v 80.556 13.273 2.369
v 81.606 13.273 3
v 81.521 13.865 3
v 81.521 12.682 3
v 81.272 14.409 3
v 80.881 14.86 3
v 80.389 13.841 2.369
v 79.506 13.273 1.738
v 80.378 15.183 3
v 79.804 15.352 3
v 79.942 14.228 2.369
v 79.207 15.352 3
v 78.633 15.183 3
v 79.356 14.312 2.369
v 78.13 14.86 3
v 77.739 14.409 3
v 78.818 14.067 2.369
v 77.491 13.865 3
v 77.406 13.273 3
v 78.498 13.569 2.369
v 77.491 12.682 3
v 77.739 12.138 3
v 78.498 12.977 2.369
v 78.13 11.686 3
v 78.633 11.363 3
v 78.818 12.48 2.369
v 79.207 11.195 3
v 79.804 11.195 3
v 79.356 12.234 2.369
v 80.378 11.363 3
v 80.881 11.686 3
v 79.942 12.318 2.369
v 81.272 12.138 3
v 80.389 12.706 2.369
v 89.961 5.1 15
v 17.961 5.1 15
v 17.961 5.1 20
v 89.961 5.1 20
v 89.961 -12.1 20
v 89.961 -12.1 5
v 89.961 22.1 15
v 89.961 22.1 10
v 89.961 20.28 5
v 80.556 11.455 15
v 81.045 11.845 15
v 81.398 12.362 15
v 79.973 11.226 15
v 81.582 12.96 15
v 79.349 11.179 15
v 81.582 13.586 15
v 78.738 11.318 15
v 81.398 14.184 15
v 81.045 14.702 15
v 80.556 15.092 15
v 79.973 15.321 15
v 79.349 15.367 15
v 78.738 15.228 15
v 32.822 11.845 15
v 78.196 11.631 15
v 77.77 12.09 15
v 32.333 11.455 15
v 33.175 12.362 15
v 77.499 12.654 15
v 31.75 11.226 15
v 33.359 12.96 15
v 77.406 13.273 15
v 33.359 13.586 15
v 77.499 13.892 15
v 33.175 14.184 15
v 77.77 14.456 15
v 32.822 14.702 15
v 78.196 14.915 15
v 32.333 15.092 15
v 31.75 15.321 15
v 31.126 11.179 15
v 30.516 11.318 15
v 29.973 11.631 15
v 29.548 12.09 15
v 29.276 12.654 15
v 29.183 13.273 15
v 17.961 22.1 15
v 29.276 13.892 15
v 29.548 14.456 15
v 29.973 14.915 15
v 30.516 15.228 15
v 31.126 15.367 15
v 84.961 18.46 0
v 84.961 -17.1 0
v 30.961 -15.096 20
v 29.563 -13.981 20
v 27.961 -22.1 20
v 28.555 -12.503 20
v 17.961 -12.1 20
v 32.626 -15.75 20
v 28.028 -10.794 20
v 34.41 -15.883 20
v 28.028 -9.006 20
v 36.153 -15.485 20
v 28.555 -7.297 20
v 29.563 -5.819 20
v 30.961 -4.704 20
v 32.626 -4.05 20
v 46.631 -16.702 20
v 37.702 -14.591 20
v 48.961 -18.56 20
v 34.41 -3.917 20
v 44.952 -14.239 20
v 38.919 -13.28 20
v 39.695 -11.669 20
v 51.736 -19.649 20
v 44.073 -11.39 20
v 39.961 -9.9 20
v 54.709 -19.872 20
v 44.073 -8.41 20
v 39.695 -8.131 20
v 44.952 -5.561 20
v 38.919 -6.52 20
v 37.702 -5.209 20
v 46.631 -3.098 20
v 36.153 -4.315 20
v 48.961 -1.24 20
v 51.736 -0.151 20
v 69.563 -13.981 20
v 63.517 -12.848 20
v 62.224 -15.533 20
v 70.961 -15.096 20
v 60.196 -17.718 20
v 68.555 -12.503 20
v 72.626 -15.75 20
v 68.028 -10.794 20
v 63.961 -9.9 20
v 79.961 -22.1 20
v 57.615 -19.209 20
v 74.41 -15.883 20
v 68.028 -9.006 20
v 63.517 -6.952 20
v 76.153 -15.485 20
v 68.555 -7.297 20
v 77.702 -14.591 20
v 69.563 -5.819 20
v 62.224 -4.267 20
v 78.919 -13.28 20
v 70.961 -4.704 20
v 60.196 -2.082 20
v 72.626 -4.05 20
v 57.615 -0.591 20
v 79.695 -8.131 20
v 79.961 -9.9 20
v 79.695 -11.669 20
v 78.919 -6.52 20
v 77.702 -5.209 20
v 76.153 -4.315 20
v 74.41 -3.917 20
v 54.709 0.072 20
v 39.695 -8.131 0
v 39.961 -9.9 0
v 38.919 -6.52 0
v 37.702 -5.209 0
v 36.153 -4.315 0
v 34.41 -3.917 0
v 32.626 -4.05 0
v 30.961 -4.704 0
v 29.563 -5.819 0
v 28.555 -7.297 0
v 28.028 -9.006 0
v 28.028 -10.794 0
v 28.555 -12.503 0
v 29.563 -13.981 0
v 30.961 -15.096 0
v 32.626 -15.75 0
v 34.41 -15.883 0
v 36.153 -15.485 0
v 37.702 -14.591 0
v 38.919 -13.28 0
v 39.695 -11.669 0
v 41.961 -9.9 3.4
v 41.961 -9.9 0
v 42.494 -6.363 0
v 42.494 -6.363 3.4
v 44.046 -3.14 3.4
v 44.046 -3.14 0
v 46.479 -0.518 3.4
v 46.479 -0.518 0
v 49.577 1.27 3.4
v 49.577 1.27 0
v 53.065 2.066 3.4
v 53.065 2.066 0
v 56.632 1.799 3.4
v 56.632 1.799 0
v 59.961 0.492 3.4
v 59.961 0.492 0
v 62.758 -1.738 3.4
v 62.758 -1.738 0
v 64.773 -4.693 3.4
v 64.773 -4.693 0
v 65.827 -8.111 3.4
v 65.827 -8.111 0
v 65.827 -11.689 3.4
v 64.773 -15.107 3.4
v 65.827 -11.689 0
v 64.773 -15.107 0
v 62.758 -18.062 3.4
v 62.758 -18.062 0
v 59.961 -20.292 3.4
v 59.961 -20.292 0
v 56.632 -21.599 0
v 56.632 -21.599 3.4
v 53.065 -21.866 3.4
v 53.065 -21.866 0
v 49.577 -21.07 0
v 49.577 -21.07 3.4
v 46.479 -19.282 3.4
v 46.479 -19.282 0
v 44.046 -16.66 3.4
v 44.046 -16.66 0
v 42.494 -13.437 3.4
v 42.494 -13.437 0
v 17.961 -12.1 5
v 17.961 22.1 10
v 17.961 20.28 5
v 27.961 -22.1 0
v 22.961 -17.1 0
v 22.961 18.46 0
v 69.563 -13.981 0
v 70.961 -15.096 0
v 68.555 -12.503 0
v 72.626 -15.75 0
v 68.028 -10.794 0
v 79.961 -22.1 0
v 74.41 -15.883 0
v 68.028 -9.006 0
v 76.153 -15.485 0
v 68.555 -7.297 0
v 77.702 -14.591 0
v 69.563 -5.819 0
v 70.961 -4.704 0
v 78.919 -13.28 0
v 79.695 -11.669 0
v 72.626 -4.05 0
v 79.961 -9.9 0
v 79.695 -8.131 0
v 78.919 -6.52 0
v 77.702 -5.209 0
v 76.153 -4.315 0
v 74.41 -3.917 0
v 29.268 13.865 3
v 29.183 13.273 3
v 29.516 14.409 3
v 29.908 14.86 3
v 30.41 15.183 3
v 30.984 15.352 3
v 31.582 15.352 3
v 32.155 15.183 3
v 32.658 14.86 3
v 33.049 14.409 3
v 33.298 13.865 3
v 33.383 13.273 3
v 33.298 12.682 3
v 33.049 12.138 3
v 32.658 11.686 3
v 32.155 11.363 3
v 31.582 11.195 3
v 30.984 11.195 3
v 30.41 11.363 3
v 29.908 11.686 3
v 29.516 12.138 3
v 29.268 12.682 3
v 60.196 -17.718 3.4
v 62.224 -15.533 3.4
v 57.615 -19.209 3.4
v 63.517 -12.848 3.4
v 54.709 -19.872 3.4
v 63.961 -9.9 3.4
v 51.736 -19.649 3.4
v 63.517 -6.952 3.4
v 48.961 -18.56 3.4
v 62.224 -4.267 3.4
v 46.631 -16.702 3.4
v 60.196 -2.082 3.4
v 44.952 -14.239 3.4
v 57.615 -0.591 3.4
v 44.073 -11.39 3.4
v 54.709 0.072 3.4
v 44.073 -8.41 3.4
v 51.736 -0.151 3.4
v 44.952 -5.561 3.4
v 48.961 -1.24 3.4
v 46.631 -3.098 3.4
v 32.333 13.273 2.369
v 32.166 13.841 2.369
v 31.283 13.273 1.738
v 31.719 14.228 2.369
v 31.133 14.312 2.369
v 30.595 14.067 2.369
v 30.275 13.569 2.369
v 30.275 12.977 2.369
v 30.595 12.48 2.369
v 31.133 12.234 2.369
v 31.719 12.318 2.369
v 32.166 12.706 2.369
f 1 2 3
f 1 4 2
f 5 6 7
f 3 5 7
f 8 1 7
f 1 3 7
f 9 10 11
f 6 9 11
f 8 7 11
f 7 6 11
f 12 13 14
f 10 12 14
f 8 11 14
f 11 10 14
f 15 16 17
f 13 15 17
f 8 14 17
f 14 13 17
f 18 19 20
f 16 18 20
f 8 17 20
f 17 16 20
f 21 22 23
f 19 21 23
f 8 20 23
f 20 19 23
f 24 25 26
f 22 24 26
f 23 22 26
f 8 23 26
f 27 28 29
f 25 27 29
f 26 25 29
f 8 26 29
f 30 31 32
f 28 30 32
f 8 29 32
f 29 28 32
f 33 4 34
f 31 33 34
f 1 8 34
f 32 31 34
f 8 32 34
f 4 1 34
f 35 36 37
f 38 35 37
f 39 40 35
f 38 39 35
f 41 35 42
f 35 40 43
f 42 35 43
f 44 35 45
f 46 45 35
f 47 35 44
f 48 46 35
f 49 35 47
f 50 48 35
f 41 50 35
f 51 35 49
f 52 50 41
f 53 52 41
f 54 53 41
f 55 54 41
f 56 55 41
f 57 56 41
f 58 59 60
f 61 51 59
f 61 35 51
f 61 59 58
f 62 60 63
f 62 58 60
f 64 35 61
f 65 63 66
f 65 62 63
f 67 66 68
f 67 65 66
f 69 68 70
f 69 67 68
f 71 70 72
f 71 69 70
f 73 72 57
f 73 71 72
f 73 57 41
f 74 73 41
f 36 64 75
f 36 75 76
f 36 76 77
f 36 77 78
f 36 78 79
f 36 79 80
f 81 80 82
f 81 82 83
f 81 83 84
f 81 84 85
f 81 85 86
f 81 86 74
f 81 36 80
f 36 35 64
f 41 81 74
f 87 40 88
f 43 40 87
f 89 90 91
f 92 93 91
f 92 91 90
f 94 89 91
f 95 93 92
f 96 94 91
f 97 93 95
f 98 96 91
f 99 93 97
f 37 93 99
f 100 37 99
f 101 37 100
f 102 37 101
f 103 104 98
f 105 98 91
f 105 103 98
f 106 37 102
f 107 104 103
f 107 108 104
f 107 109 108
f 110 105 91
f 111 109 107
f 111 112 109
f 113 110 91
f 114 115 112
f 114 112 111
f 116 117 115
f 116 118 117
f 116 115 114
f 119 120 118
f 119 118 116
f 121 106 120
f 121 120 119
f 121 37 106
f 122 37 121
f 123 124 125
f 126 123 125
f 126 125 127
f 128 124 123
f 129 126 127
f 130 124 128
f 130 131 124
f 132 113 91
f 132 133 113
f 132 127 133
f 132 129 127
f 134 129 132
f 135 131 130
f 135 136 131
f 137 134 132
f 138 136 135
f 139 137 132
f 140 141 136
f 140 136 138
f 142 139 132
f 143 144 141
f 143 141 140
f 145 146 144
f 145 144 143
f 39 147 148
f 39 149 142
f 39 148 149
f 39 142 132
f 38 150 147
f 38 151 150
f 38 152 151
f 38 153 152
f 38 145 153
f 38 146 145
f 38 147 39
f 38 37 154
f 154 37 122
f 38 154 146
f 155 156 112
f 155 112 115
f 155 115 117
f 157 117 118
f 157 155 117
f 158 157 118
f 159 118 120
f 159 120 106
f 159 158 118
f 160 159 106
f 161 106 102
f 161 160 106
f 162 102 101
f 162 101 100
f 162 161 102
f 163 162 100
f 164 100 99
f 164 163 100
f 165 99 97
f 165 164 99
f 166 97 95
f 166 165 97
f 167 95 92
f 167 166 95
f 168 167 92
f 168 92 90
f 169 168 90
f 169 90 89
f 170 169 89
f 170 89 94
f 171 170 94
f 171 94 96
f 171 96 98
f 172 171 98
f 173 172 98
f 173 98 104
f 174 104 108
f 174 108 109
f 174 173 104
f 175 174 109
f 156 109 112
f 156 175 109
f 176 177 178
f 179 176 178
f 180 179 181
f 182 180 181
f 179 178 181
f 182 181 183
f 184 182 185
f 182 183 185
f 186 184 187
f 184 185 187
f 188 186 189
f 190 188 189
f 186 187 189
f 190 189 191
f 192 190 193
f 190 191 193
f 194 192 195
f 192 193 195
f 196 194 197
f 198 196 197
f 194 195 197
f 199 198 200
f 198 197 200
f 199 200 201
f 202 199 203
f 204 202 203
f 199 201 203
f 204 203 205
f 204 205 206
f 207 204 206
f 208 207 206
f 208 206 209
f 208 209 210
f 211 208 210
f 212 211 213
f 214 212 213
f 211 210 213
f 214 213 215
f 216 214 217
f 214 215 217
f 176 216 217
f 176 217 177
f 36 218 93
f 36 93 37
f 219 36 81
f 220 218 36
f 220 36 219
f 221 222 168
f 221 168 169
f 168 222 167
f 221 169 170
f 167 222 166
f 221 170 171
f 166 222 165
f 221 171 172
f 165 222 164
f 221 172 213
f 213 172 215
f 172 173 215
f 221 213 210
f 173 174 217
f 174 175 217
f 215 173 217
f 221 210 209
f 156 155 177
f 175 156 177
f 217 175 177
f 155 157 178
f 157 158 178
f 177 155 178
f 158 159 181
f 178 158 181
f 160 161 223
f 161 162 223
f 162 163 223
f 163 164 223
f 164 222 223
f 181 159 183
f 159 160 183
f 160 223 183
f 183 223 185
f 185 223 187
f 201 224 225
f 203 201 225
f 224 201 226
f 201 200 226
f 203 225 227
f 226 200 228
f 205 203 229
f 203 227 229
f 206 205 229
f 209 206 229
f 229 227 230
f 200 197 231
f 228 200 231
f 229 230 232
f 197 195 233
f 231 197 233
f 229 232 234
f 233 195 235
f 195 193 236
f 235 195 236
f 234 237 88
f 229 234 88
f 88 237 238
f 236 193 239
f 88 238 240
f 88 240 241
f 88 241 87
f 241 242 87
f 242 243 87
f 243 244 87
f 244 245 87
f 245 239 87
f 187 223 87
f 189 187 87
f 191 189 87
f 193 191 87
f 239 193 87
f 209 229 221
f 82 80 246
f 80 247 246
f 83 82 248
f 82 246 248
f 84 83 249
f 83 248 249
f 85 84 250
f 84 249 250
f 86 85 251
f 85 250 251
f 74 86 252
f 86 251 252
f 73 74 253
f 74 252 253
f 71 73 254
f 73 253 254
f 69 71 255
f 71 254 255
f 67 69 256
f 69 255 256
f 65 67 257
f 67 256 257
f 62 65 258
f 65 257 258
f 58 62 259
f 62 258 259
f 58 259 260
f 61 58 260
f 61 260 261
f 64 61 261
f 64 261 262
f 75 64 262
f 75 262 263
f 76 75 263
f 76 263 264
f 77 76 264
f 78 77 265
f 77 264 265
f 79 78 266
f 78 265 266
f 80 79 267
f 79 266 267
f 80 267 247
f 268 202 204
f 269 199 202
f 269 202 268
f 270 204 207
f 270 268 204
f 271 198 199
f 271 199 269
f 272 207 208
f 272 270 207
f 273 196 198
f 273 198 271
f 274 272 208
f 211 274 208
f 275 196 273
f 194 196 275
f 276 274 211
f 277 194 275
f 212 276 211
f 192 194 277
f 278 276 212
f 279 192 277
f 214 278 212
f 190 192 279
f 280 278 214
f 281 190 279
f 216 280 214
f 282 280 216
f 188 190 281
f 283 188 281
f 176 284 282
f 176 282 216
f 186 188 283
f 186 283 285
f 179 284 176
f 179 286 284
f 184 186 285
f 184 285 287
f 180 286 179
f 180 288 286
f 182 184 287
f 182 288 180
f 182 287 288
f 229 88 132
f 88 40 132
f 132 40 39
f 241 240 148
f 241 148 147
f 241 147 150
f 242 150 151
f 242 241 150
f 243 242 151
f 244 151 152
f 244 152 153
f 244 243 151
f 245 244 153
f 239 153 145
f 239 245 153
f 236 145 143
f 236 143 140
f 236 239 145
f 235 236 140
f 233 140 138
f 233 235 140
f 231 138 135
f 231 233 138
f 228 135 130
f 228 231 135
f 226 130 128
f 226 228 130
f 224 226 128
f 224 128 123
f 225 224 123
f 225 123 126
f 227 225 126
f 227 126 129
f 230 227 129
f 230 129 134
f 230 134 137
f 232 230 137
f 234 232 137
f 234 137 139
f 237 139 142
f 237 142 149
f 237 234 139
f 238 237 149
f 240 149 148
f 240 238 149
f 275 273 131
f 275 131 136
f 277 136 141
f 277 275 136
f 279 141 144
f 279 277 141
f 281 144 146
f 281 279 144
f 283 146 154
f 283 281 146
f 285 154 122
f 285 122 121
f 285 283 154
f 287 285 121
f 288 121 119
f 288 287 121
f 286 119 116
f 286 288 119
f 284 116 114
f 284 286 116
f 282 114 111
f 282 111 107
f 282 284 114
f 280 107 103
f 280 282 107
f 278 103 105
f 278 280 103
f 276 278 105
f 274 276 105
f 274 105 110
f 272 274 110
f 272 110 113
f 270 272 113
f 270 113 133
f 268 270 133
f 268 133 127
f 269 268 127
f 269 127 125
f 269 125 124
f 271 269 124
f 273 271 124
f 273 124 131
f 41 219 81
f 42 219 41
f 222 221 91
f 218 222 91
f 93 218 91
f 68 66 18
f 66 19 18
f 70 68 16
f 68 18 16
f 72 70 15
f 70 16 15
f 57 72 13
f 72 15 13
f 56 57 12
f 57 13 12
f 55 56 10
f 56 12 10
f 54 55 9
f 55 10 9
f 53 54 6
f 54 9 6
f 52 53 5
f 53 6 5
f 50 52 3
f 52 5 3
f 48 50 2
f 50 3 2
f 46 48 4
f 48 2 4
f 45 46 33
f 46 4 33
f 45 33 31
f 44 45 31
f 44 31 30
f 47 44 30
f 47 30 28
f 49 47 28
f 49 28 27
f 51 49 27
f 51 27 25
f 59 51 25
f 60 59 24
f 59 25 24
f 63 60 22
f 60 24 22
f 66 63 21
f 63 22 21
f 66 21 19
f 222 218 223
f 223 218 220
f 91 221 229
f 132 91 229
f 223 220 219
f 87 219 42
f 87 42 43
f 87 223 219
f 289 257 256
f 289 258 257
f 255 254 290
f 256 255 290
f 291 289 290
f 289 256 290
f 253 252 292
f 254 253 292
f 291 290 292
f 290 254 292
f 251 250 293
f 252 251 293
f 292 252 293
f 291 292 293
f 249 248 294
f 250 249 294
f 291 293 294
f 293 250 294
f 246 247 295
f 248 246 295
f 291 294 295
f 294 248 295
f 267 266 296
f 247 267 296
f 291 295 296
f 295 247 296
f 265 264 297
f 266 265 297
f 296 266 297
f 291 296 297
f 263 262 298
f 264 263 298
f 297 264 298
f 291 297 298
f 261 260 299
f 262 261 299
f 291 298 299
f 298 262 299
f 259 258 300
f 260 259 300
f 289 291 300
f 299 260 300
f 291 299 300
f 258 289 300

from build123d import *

# Parameters (mm, degrees)
SKIZZE1_W                       = 72
SKIZZE1_H                       = 44.2
SKIZZE1_R                       = 10
SKIZZE1_R_2                     = 6
AUFSATZ_LINEAR_AUSTRAGEN1_DEPTH = 20
FASE1_SIZE                      = 10
FASE2_SIZE                      = 10
FASE6_SIZE                      = 10
FASE6_SIZE2                     = 3.639702343
FASE7_SIZE                      = 5
SKIZZE3_W                       = 5
SKIZZE3_H                       = 17
SCHNITT_LINEAR_AUSTRAGEN1_DEPTH = 80
SKIZZE11_R                      = 12
SCHNITT_LINEAR_AUSTRAGEN2_DEPTH = 3.4
M5_GEWINDEBOHRUNG1_D            = 4.2
M5_GEWINDEBOHRUNG1_DEPTH        = 12
M5_GEWINDEBOHRUNG1_TIP          = 1.2618073


with BuildPart() as part:
    # Skizze1 → Aufsatz-Linear austragen1 (new body)
    with BuildSketch(Plane.XY):
        with Locations((53.961300324, 0)):
            Rectangle(SKIZZE1_W, SKIZZE1_H)
        with Locations((53.961300324, -9.9)):
            Circle(SKIZZE1_R, mode=Mode.SUBTRACT)
        with Locations((33.961300324, -9.9)):
            Circle(SKIZZE1_R_2, mode=Mode.SUBTRACT)
        with Locations((73.961300324, -9.9)):
            Circle(SKIZZE1_R_2, mode=Mode.SUBTRACT)
    extrude(amount=AUFSATZ_LINEAR_AUSTRAGEN1_DEPTH)

    # Fase1
    fase1_edges = [part.edges().sort_by_distance(p)[0] for p in [
        (17.961300324, -22.1, 10),
    ]]
    chamfer(fase1_edges, length=FASE1_SIZE)

    # Fase2
    fase2_edges = [part.edges().sort_by_distance(p)[0] for p in [
        (89.961300324, -22.1, 10),
    ]]
    chamfer(fase2_edges, length=FASE2_SIZE)

    # Fase6
    fase6_edges = [part.edges().sort_by_distance(p)[0] for p in [
        (53.961300324, 22.1, 0),
    ]]
    fase6_side = [part.faces().sort_by_distance(p)[0] for p in [
        (53.961300324, 22.1, 10),
    ]]
    chamfer(fase6_edges, length=FASE6_SIZE, length2=FASE6_SIZE2, reference=fase6_side[0])

    # Fase7
    fase7_edges = [part.edges().sort_by_distance(p)[0] for p in [
        (89.961300324, 3.180148829, 0),
        (17.961300324, 3.180148829, 0),
    ]]
    chamfer(fase7_edges, length=FASE7_SIZE)

    # Skizze3 → Schnitt-Linear austragen1 (cut)
    with BuildSketch(Plane.ZY.offset(-17.961300324)):
        with Locations((17.5, 13.6)):
            Rectangle(SKIZZE3_W, SKIZZE3_H)
    extrude(amount=-SCHNITT_LINEAR_AUSTRAGEN1_DEPTH, mode=Mode.SUBTRACT)

    # Skizze11 → Schnitt-Linear austragen2 (cut)
    with BuildSketch(Plane(origin=(0, 0, 0), x_dir=(-1, 0, 0), z_dir=(0, 0, -1))):
        with Locations((-53.961300324, -9.9)):
            Circle(SKIZZE11_R)
    extrude(amount=-SCHNITT_LINEAR_AUSTRAGEN2_DEPTH, mode=Mode.SUBTRACT)

    # M5 Gewindebohrung1
    with Locations(Plane.XY.offset(15)):
        with Locations((31.282727226, 13.273175205), (79.505567547, 13.273175205)):
            Hole(M5_GEWINDEBOHRUNG1_D / 2, depth=M5_GEWINDEBOHRUNG1_DEPTH)
            with Locations((0, 0, -(M5_GEWINDEBOHRUNG1_DEPTH + M5_GEWINDEBOHRUNG1_TIP / 2))):  # 118° drill point
                Cone(0, M5_GEWINDEBOHRUNG1_D / 2, M5_GEWINDEBOHRUNG1_TIP, mode=Mode.SUBTRACT)


solid = part.part
